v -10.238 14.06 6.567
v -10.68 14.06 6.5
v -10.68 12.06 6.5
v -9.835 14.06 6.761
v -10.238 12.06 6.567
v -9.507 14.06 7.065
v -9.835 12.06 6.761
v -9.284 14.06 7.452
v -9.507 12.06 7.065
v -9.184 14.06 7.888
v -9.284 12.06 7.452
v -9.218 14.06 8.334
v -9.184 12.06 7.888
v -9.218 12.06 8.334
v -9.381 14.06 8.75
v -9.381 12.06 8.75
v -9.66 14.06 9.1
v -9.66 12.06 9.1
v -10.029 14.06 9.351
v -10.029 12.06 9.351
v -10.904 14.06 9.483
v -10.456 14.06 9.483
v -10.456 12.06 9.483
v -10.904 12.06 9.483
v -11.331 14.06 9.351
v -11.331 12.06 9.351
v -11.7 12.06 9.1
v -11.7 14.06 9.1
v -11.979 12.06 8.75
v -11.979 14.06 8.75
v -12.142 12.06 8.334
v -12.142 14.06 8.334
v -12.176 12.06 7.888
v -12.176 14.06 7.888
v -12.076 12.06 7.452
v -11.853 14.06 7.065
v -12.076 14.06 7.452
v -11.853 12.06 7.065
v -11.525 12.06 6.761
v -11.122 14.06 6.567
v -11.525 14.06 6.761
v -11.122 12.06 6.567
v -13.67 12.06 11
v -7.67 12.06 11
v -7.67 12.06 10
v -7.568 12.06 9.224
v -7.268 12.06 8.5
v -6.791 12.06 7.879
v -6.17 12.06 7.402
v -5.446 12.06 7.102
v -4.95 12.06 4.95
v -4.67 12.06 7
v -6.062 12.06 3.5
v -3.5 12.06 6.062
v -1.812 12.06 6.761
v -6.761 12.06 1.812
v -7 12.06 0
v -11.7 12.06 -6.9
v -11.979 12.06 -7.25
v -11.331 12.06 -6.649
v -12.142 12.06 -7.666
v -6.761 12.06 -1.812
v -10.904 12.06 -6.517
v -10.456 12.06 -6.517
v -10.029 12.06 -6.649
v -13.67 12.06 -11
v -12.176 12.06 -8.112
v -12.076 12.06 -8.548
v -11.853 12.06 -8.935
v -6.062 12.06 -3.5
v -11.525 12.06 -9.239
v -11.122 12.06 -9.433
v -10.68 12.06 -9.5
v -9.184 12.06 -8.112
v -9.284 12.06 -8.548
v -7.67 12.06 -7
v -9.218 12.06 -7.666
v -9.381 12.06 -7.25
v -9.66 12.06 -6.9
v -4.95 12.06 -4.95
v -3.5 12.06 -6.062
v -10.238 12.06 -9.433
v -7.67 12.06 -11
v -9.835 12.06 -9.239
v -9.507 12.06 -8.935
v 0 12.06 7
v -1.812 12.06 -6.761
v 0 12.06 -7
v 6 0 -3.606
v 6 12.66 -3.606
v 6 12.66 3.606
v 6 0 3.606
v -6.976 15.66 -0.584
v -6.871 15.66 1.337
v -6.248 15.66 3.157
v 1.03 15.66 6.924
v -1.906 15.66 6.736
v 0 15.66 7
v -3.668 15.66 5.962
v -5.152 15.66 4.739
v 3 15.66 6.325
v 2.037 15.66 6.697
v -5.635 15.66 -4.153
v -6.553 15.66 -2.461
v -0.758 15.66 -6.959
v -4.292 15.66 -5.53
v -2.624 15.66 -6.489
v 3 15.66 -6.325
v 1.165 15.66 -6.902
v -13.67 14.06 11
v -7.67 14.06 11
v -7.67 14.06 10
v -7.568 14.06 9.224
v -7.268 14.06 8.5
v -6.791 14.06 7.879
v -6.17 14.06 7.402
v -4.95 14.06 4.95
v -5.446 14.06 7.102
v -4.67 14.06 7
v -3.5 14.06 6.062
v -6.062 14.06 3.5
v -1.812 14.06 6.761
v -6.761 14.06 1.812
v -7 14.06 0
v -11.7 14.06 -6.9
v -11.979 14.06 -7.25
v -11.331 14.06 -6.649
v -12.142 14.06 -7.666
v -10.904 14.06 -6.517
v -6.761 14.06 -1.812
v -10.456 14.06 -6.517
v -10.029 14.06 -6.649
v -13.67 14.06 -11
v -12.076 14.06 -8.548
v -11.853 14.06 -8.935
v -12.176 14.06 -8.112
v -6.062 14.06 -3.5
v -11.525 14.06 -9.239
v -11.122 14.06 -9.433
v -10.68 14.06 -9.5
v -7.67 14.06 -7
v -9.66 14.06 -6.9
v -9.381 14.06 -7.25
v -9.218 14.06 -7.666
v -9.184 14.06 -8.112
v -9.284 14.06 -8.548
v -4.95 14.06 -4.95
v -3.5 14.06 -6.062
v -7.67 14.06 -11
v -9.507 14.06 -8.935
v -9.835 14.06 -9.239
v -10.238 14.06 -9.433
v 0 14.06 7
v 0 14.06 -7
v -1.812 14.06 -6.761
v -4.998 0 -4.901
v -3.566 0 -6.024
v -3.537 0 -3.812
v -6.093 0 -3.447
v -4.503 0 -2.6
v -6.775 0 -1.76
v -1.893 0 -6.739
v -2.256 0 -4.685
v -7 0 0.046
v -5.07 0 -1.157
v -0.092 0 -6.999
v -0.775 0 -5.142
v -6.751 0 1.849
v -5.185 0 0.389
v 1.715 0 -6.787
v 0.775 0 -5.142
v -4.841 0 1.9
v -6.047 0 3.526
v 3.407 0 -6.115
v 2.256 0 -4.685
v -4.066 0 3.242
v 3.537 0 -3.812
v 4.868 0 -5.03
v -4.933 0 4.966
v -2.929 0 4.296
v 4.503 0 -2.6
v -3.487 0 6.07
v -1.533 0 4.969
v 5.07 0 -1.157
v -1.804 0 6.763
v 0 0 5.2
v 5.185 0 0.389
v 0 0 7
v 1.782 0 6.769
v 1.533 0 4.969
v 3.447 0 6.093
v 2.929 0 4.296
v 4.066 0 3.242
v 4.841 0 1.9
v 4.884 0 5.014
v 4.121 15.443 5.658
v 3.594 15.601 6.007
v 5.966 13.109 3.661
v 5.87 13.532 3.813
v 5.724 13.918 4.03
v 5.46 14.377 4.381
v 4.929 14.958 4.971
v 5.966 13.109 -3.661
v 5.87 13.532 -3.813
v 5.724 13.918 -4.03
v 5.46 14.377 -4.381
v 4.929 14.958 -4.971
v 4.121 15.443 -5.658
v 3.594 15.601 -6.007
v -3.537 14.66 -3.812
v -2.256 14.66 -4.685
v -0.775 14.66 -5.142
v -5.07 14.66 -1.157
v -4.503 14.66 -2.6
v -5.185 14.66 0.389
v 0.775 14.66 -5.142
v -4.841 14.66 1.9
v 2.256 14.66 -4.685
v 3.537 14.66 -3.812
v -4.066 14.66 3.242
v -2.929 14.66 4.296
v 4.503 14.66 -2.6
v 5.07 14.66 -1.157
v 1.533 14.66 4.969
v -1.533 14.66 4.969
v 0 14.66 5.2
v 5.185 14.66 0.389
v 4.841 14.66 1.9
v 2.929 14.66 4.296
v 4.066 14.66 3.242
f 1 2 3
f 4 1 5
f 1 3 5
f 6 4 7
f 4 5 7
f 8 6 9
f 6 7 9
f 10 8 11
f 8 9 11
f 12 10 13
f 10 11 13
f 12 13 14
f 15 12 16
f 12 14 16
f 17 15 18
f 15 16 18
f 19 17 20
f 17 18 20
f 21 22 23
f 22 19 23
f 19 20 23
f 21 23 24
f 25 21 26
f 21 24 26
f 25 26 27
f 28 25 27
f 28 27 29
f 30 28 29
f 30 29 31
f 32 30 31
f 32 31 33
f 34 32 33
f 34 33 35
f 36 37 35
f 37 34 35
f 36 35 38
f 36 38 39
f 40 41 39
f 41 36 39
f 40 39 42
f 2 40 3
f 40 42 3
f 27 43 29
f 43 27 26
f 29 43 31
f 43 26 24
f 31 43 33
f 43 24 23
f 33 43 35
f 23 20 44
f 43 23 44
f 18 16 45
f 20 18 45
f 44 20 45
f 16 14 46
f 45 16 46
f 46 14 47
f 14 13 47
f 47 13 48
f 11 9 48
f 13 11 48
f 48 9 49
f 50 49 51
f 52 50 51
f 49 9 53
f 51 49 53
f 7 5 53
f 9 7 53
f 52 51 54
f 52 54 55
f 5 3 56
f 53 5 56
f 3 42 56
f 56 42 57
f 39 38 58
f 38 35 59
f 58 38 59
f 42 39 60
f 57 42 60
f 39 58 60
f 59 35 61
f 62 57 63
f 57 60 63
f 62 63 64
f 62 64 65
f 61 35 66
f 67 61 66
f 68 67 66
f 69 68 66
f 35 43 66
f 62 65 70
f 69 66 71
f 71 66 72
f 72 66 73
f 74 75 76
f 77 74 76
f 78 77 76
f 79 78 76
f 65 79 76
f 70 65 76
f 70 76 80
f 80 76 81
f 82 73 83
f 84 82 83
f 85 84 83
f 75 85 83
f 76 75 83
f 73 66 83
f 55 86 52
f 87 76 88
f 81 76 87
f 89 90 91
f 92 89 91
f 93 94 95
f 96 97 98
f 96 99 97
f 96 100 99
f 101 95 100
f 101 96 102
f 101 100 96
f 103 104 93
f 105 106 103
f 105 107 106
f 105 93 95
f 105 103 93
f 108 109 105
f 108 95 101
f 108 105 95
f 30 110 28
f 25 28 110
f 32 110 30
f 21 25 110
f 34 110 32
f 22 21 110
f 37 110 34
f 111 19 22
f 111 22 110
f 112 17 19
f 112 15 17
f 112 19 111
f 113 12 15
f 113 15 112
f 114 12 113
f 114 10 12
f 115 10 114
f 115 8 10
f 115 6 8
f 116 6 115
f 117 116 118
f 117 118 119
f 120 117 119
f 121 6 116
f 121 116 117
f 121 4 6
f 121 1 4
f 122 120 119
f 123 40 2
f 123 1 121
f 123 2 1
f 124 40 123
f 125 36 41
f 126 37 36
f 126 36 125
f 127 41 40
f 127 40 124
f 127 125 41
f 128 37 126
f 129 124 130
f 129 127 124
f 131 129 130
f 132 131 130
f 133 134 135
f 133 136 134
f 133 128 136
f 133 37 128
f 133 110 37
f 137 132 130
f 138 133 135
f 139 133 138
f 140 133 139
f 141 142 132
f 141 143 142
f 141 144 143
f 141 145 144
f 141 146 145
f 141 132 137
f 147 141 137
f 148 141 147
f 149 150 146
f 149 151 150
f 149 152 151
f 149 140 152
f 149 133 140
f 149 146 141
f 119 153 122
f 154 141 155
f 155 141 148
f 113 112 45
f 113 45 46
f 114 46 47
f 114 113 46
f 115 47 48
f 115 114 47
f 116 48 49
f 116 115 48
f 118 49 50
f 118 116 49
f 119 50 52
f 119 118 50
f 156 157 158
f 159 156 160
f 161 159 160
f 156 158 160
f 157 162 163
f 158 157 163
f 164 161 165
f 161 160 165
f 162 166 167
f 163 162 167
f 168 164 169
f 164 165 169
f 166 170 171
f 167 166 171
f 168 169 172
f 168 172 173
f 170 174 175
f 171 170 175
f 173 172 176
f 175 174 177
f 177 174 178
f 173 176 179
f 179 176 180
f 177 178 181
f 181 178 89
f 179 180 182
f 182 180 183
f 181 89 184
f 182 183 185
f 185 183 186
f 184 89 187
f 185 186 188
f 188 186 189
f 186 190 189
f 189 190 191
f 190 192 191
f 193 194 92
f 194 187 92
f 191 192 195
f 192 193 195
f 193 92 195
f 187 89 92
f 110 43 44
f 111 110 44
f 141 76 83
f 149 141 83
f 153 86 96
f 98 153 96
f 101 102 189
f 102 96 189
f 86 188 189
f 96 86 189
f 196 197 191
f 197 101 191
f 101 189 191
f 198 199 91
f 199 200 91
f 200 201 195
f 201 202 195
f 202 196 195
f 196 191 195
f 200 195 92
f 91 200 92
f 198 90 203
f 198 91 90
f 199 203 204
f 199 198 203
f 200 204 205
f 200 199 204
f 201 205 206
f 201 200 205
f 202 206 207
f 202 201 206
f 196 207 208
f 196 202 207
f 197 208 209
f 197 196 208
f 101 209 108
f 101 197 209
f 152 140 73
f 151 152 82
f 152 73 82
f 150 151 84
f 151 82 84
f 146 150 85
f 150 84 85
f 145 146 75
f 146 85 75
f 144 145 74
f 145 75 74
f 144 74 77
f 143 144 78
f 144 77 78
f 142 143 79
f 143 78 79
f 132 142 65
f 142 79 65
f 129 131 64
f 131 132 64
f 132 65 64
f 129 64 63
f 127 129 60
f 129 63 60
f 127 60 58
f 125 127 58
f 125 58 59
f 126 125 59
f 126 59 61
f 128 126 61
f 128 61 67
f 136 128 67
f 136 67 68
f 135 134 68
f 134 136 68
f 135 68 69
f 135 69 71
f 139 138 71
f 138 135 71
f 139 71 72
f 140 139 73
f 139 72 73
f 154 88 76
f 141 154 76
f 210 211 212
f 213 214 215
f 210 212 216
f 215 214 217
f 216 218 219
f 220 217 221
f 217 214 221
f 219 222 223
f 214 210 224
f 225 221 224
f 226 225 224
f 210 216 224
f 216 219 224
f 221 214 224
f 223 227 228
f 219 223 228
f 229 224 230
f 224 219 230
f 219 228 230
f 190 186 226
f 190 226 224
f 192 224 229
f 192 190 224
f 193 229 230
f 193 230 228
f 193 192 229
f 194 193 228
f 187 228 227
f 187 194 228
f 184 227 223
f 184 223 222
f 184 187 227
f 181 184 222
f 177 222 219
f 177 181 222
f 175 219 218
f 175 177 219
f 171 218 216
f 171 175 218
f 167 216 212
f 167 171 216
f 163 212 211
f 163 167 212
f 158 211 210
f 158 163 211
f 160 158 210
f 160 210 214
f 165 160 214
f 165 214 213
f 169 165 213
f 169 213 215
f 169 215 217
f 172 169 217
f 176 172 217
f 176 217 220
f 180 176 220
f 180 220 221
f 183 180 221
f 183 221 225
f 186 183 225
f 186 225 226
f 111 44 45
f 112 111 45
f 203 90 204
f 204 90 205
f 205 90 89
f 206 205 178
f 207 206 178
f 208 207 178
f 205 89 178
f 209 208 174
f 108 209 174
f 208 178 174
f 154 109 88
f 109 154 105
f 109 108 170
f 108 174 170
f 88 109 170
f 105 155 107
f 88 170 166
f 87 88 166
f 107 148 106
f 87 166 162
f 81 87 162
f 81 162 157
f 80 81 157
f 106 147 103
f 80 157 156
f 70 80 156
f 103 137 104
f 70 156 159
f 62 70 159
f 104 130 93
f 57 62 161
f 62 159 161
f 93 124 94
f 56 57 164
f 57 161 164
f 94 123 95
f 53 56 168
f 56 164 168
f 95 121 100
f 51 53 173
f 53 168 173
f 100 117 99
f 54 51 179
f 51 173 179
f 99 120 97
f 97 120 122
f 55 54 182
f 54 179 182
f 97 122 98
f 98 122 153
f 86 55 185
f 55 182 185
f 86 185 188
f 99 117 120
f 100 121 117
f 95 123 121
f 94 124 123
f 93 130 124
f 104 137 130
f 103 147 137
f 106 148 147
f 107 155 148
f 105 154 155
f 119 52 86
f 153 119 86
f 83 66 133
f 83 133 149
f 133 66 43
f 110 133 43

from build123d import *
from build123d.topology import SkipClean

# Parameters (mm, degrees)
SKETCH1_R           = 7
SKETCH1_R_2         = 5.2
BOSS_EXTRUDE1_DEPTH = 15.66
BOSS_EXTRUDE2_START = -3.6
SKETCH2_W           = 6
SKETCH2_H           = 4
BOSS_EXTRUDE2_DEPTH = 3.6
CUT_EXTRUDE2_START  = -1.6
SKETCH2_3_W         = 6
SKETCH2_3_H         = 4
CUT_EXTRUDE2_DEPTH  = 1.6
SKETCH4_R           = 1.5
CUT_EXTRUDE1_DEPTH  = 10
FILLET7_R           = 3
BOSS_EXTRUDE3_START = -1
SKETCH5_R           = 5.2
BOSS_EXTRUDE3_DEPTH = 1
CUT_EXTRUDE3_DEPTH  = 15.66
FILLET8_R           = 3


with BuildPart() as part:
    # Sketch1 → Boss-Extrude1 (new body)
    with BuildSketch(Plane(origin=(0, 0, 0), x_dir=(1, 0, 0), z_dir=(0, 1, 0))):
        with Locations(Location((0, 0, 0), (0, 0, 270))):
            Circle(SKETCH1_R)
        with Locations(Location((0, 0, 0), (0, 0, 270))):
            Circle(SKETCH1_R_2, mode=Mode.SUBTRACT)
    extrude(amount=BOSS_EXTRUDE1_DEPTH)

    # Sketch2 → Boss-Extrude2 (add)
    with BuildSketch(Plane(origin=(0, 15.66, 0), x_dir=(1, 0, 0), z_dir=(0, 1, 0)).offset(BOSS_EXTRUDE2_START)):
        with Locations((-10.67, -9)):
            Rectangle(SKETCH2_W, SKETCH2_H)
        with BuildLine():
            ThreePointArc((0, -7), (-7, 0), (0, 7))
            Line((0, 7), (-7.67, 7))
            Line((-7.67, 7), (-13.67, 7))
            Line((-13.67, 7), (-13.67, -7))
            Line((-13.67, -7), (-7.67, -7))
            Line((-7.67, -7), (0, -7))
        make_face()
        with Locations((-10.67, 9)):
            Rectangle(SKETCH2_W, SKETCH2_H)
    extrude(amount=BOSS_EXTRUDE2_DEPTH)

    # Sketch2<3> → Cut-Extrude2 (cut)
    with SkipClean():  # the faces are left unmerged after this step: merging them gives an invalid solid
        with BuildSketch(Plane(origin=(0, 15.66, 0), x_dir=(1, 0, 0), z_dir=(0, 1, 0)).offset(CUT_EXTRUDE2_START)):
            with BuildLine():
                ThreePointArc((0, -7), (-7, 0), (0, 7))
                Line((0, 7), (-7.67, 7))
                Line((-7.67, 7), (-13.67, 7))
                Line((-13.67, 7), (-13.67, -7))
                Line((-13.67, -7), (-7.67, -7))
                Line((-7.67, -7), (0, -7))
            make_face()
            with Locations((-10.67, 9)):
                Rectangle(SKETCH2_3_W, SKETCH2_3_H)
            with Locations((-10.67, -9)):
                Rectangle(SKETCH2_3_W, SKETCH2_3_H)
        extrude(amount=CUT_EXTRUDE2_DEPTH, mode=Mode.SUBTRACT)

    # Sketch4 → Cut-Extrude1 (cut)
    with SkipClean():  # the faces are left unmerged after this step: merging them gives an invalid solid
        with BuildSketch(Plane.XZ.offset(-12.06)):
            with Locations(Location((-10.68, -8, 0), (0, 0, 270))):
                Circle(SKETCH4_R)
            with Locations(Location((-10.68, 8, 0), (0, 0, 270))):
                Circle(SKETCH4_R)
        extrude(amount=-CUT_EXTRUDE1_DEPTH, mode=Mode.SUBTRACT)

    # Fillet7
    fillet7_edges = [part.edges().sort_by_distance(p)[0] for p in [
        (-7.67, 13.06, 7),
    ]]
    fillet(fillet7_edges, radius=FILLET7_R)

    # Sketch5 → Boss-Extrude3 (add)
    with SkipClean():  # the faces are left unmerged after this step: merging them gives an invalid solid
        with BuildSketch(Plane(origin=(0, 15.66, 0), x_dir=(1, 0, 0), z_dir=(0, 1, 0)).offset(BOSS_EXTRUDE3_START)):
            with Locations(Location((0, 0, 0), (0, 0, 270))):
                Circle(SKETCH5_R)
        extrude(amount=BOSS_EXTRUDE3_DEPTH)

    # Sketch6 → Cut-Extrude3 (cut)
    with BuildSketch(Plane.XZ):
        with BuildLine():
            Line((6, -3.605551275), (6, 3.605551275))
            ThreePointArc((6, 3.605551275), (7, 0), (6, -3.605551275))
        make_face()
    extrude(amount=-CUT_EXTRUDE3_DEPTH, mode=Mode.SUBTRACT)

    # Fillet8
    fillet8_edges = [part.edges().sort_by_distance(p)[0] for p in [
        (6, 15.66, 0),
    ]]
    fillet(fillet8_edges, radius=FILLET8_R)


solid = part.part
